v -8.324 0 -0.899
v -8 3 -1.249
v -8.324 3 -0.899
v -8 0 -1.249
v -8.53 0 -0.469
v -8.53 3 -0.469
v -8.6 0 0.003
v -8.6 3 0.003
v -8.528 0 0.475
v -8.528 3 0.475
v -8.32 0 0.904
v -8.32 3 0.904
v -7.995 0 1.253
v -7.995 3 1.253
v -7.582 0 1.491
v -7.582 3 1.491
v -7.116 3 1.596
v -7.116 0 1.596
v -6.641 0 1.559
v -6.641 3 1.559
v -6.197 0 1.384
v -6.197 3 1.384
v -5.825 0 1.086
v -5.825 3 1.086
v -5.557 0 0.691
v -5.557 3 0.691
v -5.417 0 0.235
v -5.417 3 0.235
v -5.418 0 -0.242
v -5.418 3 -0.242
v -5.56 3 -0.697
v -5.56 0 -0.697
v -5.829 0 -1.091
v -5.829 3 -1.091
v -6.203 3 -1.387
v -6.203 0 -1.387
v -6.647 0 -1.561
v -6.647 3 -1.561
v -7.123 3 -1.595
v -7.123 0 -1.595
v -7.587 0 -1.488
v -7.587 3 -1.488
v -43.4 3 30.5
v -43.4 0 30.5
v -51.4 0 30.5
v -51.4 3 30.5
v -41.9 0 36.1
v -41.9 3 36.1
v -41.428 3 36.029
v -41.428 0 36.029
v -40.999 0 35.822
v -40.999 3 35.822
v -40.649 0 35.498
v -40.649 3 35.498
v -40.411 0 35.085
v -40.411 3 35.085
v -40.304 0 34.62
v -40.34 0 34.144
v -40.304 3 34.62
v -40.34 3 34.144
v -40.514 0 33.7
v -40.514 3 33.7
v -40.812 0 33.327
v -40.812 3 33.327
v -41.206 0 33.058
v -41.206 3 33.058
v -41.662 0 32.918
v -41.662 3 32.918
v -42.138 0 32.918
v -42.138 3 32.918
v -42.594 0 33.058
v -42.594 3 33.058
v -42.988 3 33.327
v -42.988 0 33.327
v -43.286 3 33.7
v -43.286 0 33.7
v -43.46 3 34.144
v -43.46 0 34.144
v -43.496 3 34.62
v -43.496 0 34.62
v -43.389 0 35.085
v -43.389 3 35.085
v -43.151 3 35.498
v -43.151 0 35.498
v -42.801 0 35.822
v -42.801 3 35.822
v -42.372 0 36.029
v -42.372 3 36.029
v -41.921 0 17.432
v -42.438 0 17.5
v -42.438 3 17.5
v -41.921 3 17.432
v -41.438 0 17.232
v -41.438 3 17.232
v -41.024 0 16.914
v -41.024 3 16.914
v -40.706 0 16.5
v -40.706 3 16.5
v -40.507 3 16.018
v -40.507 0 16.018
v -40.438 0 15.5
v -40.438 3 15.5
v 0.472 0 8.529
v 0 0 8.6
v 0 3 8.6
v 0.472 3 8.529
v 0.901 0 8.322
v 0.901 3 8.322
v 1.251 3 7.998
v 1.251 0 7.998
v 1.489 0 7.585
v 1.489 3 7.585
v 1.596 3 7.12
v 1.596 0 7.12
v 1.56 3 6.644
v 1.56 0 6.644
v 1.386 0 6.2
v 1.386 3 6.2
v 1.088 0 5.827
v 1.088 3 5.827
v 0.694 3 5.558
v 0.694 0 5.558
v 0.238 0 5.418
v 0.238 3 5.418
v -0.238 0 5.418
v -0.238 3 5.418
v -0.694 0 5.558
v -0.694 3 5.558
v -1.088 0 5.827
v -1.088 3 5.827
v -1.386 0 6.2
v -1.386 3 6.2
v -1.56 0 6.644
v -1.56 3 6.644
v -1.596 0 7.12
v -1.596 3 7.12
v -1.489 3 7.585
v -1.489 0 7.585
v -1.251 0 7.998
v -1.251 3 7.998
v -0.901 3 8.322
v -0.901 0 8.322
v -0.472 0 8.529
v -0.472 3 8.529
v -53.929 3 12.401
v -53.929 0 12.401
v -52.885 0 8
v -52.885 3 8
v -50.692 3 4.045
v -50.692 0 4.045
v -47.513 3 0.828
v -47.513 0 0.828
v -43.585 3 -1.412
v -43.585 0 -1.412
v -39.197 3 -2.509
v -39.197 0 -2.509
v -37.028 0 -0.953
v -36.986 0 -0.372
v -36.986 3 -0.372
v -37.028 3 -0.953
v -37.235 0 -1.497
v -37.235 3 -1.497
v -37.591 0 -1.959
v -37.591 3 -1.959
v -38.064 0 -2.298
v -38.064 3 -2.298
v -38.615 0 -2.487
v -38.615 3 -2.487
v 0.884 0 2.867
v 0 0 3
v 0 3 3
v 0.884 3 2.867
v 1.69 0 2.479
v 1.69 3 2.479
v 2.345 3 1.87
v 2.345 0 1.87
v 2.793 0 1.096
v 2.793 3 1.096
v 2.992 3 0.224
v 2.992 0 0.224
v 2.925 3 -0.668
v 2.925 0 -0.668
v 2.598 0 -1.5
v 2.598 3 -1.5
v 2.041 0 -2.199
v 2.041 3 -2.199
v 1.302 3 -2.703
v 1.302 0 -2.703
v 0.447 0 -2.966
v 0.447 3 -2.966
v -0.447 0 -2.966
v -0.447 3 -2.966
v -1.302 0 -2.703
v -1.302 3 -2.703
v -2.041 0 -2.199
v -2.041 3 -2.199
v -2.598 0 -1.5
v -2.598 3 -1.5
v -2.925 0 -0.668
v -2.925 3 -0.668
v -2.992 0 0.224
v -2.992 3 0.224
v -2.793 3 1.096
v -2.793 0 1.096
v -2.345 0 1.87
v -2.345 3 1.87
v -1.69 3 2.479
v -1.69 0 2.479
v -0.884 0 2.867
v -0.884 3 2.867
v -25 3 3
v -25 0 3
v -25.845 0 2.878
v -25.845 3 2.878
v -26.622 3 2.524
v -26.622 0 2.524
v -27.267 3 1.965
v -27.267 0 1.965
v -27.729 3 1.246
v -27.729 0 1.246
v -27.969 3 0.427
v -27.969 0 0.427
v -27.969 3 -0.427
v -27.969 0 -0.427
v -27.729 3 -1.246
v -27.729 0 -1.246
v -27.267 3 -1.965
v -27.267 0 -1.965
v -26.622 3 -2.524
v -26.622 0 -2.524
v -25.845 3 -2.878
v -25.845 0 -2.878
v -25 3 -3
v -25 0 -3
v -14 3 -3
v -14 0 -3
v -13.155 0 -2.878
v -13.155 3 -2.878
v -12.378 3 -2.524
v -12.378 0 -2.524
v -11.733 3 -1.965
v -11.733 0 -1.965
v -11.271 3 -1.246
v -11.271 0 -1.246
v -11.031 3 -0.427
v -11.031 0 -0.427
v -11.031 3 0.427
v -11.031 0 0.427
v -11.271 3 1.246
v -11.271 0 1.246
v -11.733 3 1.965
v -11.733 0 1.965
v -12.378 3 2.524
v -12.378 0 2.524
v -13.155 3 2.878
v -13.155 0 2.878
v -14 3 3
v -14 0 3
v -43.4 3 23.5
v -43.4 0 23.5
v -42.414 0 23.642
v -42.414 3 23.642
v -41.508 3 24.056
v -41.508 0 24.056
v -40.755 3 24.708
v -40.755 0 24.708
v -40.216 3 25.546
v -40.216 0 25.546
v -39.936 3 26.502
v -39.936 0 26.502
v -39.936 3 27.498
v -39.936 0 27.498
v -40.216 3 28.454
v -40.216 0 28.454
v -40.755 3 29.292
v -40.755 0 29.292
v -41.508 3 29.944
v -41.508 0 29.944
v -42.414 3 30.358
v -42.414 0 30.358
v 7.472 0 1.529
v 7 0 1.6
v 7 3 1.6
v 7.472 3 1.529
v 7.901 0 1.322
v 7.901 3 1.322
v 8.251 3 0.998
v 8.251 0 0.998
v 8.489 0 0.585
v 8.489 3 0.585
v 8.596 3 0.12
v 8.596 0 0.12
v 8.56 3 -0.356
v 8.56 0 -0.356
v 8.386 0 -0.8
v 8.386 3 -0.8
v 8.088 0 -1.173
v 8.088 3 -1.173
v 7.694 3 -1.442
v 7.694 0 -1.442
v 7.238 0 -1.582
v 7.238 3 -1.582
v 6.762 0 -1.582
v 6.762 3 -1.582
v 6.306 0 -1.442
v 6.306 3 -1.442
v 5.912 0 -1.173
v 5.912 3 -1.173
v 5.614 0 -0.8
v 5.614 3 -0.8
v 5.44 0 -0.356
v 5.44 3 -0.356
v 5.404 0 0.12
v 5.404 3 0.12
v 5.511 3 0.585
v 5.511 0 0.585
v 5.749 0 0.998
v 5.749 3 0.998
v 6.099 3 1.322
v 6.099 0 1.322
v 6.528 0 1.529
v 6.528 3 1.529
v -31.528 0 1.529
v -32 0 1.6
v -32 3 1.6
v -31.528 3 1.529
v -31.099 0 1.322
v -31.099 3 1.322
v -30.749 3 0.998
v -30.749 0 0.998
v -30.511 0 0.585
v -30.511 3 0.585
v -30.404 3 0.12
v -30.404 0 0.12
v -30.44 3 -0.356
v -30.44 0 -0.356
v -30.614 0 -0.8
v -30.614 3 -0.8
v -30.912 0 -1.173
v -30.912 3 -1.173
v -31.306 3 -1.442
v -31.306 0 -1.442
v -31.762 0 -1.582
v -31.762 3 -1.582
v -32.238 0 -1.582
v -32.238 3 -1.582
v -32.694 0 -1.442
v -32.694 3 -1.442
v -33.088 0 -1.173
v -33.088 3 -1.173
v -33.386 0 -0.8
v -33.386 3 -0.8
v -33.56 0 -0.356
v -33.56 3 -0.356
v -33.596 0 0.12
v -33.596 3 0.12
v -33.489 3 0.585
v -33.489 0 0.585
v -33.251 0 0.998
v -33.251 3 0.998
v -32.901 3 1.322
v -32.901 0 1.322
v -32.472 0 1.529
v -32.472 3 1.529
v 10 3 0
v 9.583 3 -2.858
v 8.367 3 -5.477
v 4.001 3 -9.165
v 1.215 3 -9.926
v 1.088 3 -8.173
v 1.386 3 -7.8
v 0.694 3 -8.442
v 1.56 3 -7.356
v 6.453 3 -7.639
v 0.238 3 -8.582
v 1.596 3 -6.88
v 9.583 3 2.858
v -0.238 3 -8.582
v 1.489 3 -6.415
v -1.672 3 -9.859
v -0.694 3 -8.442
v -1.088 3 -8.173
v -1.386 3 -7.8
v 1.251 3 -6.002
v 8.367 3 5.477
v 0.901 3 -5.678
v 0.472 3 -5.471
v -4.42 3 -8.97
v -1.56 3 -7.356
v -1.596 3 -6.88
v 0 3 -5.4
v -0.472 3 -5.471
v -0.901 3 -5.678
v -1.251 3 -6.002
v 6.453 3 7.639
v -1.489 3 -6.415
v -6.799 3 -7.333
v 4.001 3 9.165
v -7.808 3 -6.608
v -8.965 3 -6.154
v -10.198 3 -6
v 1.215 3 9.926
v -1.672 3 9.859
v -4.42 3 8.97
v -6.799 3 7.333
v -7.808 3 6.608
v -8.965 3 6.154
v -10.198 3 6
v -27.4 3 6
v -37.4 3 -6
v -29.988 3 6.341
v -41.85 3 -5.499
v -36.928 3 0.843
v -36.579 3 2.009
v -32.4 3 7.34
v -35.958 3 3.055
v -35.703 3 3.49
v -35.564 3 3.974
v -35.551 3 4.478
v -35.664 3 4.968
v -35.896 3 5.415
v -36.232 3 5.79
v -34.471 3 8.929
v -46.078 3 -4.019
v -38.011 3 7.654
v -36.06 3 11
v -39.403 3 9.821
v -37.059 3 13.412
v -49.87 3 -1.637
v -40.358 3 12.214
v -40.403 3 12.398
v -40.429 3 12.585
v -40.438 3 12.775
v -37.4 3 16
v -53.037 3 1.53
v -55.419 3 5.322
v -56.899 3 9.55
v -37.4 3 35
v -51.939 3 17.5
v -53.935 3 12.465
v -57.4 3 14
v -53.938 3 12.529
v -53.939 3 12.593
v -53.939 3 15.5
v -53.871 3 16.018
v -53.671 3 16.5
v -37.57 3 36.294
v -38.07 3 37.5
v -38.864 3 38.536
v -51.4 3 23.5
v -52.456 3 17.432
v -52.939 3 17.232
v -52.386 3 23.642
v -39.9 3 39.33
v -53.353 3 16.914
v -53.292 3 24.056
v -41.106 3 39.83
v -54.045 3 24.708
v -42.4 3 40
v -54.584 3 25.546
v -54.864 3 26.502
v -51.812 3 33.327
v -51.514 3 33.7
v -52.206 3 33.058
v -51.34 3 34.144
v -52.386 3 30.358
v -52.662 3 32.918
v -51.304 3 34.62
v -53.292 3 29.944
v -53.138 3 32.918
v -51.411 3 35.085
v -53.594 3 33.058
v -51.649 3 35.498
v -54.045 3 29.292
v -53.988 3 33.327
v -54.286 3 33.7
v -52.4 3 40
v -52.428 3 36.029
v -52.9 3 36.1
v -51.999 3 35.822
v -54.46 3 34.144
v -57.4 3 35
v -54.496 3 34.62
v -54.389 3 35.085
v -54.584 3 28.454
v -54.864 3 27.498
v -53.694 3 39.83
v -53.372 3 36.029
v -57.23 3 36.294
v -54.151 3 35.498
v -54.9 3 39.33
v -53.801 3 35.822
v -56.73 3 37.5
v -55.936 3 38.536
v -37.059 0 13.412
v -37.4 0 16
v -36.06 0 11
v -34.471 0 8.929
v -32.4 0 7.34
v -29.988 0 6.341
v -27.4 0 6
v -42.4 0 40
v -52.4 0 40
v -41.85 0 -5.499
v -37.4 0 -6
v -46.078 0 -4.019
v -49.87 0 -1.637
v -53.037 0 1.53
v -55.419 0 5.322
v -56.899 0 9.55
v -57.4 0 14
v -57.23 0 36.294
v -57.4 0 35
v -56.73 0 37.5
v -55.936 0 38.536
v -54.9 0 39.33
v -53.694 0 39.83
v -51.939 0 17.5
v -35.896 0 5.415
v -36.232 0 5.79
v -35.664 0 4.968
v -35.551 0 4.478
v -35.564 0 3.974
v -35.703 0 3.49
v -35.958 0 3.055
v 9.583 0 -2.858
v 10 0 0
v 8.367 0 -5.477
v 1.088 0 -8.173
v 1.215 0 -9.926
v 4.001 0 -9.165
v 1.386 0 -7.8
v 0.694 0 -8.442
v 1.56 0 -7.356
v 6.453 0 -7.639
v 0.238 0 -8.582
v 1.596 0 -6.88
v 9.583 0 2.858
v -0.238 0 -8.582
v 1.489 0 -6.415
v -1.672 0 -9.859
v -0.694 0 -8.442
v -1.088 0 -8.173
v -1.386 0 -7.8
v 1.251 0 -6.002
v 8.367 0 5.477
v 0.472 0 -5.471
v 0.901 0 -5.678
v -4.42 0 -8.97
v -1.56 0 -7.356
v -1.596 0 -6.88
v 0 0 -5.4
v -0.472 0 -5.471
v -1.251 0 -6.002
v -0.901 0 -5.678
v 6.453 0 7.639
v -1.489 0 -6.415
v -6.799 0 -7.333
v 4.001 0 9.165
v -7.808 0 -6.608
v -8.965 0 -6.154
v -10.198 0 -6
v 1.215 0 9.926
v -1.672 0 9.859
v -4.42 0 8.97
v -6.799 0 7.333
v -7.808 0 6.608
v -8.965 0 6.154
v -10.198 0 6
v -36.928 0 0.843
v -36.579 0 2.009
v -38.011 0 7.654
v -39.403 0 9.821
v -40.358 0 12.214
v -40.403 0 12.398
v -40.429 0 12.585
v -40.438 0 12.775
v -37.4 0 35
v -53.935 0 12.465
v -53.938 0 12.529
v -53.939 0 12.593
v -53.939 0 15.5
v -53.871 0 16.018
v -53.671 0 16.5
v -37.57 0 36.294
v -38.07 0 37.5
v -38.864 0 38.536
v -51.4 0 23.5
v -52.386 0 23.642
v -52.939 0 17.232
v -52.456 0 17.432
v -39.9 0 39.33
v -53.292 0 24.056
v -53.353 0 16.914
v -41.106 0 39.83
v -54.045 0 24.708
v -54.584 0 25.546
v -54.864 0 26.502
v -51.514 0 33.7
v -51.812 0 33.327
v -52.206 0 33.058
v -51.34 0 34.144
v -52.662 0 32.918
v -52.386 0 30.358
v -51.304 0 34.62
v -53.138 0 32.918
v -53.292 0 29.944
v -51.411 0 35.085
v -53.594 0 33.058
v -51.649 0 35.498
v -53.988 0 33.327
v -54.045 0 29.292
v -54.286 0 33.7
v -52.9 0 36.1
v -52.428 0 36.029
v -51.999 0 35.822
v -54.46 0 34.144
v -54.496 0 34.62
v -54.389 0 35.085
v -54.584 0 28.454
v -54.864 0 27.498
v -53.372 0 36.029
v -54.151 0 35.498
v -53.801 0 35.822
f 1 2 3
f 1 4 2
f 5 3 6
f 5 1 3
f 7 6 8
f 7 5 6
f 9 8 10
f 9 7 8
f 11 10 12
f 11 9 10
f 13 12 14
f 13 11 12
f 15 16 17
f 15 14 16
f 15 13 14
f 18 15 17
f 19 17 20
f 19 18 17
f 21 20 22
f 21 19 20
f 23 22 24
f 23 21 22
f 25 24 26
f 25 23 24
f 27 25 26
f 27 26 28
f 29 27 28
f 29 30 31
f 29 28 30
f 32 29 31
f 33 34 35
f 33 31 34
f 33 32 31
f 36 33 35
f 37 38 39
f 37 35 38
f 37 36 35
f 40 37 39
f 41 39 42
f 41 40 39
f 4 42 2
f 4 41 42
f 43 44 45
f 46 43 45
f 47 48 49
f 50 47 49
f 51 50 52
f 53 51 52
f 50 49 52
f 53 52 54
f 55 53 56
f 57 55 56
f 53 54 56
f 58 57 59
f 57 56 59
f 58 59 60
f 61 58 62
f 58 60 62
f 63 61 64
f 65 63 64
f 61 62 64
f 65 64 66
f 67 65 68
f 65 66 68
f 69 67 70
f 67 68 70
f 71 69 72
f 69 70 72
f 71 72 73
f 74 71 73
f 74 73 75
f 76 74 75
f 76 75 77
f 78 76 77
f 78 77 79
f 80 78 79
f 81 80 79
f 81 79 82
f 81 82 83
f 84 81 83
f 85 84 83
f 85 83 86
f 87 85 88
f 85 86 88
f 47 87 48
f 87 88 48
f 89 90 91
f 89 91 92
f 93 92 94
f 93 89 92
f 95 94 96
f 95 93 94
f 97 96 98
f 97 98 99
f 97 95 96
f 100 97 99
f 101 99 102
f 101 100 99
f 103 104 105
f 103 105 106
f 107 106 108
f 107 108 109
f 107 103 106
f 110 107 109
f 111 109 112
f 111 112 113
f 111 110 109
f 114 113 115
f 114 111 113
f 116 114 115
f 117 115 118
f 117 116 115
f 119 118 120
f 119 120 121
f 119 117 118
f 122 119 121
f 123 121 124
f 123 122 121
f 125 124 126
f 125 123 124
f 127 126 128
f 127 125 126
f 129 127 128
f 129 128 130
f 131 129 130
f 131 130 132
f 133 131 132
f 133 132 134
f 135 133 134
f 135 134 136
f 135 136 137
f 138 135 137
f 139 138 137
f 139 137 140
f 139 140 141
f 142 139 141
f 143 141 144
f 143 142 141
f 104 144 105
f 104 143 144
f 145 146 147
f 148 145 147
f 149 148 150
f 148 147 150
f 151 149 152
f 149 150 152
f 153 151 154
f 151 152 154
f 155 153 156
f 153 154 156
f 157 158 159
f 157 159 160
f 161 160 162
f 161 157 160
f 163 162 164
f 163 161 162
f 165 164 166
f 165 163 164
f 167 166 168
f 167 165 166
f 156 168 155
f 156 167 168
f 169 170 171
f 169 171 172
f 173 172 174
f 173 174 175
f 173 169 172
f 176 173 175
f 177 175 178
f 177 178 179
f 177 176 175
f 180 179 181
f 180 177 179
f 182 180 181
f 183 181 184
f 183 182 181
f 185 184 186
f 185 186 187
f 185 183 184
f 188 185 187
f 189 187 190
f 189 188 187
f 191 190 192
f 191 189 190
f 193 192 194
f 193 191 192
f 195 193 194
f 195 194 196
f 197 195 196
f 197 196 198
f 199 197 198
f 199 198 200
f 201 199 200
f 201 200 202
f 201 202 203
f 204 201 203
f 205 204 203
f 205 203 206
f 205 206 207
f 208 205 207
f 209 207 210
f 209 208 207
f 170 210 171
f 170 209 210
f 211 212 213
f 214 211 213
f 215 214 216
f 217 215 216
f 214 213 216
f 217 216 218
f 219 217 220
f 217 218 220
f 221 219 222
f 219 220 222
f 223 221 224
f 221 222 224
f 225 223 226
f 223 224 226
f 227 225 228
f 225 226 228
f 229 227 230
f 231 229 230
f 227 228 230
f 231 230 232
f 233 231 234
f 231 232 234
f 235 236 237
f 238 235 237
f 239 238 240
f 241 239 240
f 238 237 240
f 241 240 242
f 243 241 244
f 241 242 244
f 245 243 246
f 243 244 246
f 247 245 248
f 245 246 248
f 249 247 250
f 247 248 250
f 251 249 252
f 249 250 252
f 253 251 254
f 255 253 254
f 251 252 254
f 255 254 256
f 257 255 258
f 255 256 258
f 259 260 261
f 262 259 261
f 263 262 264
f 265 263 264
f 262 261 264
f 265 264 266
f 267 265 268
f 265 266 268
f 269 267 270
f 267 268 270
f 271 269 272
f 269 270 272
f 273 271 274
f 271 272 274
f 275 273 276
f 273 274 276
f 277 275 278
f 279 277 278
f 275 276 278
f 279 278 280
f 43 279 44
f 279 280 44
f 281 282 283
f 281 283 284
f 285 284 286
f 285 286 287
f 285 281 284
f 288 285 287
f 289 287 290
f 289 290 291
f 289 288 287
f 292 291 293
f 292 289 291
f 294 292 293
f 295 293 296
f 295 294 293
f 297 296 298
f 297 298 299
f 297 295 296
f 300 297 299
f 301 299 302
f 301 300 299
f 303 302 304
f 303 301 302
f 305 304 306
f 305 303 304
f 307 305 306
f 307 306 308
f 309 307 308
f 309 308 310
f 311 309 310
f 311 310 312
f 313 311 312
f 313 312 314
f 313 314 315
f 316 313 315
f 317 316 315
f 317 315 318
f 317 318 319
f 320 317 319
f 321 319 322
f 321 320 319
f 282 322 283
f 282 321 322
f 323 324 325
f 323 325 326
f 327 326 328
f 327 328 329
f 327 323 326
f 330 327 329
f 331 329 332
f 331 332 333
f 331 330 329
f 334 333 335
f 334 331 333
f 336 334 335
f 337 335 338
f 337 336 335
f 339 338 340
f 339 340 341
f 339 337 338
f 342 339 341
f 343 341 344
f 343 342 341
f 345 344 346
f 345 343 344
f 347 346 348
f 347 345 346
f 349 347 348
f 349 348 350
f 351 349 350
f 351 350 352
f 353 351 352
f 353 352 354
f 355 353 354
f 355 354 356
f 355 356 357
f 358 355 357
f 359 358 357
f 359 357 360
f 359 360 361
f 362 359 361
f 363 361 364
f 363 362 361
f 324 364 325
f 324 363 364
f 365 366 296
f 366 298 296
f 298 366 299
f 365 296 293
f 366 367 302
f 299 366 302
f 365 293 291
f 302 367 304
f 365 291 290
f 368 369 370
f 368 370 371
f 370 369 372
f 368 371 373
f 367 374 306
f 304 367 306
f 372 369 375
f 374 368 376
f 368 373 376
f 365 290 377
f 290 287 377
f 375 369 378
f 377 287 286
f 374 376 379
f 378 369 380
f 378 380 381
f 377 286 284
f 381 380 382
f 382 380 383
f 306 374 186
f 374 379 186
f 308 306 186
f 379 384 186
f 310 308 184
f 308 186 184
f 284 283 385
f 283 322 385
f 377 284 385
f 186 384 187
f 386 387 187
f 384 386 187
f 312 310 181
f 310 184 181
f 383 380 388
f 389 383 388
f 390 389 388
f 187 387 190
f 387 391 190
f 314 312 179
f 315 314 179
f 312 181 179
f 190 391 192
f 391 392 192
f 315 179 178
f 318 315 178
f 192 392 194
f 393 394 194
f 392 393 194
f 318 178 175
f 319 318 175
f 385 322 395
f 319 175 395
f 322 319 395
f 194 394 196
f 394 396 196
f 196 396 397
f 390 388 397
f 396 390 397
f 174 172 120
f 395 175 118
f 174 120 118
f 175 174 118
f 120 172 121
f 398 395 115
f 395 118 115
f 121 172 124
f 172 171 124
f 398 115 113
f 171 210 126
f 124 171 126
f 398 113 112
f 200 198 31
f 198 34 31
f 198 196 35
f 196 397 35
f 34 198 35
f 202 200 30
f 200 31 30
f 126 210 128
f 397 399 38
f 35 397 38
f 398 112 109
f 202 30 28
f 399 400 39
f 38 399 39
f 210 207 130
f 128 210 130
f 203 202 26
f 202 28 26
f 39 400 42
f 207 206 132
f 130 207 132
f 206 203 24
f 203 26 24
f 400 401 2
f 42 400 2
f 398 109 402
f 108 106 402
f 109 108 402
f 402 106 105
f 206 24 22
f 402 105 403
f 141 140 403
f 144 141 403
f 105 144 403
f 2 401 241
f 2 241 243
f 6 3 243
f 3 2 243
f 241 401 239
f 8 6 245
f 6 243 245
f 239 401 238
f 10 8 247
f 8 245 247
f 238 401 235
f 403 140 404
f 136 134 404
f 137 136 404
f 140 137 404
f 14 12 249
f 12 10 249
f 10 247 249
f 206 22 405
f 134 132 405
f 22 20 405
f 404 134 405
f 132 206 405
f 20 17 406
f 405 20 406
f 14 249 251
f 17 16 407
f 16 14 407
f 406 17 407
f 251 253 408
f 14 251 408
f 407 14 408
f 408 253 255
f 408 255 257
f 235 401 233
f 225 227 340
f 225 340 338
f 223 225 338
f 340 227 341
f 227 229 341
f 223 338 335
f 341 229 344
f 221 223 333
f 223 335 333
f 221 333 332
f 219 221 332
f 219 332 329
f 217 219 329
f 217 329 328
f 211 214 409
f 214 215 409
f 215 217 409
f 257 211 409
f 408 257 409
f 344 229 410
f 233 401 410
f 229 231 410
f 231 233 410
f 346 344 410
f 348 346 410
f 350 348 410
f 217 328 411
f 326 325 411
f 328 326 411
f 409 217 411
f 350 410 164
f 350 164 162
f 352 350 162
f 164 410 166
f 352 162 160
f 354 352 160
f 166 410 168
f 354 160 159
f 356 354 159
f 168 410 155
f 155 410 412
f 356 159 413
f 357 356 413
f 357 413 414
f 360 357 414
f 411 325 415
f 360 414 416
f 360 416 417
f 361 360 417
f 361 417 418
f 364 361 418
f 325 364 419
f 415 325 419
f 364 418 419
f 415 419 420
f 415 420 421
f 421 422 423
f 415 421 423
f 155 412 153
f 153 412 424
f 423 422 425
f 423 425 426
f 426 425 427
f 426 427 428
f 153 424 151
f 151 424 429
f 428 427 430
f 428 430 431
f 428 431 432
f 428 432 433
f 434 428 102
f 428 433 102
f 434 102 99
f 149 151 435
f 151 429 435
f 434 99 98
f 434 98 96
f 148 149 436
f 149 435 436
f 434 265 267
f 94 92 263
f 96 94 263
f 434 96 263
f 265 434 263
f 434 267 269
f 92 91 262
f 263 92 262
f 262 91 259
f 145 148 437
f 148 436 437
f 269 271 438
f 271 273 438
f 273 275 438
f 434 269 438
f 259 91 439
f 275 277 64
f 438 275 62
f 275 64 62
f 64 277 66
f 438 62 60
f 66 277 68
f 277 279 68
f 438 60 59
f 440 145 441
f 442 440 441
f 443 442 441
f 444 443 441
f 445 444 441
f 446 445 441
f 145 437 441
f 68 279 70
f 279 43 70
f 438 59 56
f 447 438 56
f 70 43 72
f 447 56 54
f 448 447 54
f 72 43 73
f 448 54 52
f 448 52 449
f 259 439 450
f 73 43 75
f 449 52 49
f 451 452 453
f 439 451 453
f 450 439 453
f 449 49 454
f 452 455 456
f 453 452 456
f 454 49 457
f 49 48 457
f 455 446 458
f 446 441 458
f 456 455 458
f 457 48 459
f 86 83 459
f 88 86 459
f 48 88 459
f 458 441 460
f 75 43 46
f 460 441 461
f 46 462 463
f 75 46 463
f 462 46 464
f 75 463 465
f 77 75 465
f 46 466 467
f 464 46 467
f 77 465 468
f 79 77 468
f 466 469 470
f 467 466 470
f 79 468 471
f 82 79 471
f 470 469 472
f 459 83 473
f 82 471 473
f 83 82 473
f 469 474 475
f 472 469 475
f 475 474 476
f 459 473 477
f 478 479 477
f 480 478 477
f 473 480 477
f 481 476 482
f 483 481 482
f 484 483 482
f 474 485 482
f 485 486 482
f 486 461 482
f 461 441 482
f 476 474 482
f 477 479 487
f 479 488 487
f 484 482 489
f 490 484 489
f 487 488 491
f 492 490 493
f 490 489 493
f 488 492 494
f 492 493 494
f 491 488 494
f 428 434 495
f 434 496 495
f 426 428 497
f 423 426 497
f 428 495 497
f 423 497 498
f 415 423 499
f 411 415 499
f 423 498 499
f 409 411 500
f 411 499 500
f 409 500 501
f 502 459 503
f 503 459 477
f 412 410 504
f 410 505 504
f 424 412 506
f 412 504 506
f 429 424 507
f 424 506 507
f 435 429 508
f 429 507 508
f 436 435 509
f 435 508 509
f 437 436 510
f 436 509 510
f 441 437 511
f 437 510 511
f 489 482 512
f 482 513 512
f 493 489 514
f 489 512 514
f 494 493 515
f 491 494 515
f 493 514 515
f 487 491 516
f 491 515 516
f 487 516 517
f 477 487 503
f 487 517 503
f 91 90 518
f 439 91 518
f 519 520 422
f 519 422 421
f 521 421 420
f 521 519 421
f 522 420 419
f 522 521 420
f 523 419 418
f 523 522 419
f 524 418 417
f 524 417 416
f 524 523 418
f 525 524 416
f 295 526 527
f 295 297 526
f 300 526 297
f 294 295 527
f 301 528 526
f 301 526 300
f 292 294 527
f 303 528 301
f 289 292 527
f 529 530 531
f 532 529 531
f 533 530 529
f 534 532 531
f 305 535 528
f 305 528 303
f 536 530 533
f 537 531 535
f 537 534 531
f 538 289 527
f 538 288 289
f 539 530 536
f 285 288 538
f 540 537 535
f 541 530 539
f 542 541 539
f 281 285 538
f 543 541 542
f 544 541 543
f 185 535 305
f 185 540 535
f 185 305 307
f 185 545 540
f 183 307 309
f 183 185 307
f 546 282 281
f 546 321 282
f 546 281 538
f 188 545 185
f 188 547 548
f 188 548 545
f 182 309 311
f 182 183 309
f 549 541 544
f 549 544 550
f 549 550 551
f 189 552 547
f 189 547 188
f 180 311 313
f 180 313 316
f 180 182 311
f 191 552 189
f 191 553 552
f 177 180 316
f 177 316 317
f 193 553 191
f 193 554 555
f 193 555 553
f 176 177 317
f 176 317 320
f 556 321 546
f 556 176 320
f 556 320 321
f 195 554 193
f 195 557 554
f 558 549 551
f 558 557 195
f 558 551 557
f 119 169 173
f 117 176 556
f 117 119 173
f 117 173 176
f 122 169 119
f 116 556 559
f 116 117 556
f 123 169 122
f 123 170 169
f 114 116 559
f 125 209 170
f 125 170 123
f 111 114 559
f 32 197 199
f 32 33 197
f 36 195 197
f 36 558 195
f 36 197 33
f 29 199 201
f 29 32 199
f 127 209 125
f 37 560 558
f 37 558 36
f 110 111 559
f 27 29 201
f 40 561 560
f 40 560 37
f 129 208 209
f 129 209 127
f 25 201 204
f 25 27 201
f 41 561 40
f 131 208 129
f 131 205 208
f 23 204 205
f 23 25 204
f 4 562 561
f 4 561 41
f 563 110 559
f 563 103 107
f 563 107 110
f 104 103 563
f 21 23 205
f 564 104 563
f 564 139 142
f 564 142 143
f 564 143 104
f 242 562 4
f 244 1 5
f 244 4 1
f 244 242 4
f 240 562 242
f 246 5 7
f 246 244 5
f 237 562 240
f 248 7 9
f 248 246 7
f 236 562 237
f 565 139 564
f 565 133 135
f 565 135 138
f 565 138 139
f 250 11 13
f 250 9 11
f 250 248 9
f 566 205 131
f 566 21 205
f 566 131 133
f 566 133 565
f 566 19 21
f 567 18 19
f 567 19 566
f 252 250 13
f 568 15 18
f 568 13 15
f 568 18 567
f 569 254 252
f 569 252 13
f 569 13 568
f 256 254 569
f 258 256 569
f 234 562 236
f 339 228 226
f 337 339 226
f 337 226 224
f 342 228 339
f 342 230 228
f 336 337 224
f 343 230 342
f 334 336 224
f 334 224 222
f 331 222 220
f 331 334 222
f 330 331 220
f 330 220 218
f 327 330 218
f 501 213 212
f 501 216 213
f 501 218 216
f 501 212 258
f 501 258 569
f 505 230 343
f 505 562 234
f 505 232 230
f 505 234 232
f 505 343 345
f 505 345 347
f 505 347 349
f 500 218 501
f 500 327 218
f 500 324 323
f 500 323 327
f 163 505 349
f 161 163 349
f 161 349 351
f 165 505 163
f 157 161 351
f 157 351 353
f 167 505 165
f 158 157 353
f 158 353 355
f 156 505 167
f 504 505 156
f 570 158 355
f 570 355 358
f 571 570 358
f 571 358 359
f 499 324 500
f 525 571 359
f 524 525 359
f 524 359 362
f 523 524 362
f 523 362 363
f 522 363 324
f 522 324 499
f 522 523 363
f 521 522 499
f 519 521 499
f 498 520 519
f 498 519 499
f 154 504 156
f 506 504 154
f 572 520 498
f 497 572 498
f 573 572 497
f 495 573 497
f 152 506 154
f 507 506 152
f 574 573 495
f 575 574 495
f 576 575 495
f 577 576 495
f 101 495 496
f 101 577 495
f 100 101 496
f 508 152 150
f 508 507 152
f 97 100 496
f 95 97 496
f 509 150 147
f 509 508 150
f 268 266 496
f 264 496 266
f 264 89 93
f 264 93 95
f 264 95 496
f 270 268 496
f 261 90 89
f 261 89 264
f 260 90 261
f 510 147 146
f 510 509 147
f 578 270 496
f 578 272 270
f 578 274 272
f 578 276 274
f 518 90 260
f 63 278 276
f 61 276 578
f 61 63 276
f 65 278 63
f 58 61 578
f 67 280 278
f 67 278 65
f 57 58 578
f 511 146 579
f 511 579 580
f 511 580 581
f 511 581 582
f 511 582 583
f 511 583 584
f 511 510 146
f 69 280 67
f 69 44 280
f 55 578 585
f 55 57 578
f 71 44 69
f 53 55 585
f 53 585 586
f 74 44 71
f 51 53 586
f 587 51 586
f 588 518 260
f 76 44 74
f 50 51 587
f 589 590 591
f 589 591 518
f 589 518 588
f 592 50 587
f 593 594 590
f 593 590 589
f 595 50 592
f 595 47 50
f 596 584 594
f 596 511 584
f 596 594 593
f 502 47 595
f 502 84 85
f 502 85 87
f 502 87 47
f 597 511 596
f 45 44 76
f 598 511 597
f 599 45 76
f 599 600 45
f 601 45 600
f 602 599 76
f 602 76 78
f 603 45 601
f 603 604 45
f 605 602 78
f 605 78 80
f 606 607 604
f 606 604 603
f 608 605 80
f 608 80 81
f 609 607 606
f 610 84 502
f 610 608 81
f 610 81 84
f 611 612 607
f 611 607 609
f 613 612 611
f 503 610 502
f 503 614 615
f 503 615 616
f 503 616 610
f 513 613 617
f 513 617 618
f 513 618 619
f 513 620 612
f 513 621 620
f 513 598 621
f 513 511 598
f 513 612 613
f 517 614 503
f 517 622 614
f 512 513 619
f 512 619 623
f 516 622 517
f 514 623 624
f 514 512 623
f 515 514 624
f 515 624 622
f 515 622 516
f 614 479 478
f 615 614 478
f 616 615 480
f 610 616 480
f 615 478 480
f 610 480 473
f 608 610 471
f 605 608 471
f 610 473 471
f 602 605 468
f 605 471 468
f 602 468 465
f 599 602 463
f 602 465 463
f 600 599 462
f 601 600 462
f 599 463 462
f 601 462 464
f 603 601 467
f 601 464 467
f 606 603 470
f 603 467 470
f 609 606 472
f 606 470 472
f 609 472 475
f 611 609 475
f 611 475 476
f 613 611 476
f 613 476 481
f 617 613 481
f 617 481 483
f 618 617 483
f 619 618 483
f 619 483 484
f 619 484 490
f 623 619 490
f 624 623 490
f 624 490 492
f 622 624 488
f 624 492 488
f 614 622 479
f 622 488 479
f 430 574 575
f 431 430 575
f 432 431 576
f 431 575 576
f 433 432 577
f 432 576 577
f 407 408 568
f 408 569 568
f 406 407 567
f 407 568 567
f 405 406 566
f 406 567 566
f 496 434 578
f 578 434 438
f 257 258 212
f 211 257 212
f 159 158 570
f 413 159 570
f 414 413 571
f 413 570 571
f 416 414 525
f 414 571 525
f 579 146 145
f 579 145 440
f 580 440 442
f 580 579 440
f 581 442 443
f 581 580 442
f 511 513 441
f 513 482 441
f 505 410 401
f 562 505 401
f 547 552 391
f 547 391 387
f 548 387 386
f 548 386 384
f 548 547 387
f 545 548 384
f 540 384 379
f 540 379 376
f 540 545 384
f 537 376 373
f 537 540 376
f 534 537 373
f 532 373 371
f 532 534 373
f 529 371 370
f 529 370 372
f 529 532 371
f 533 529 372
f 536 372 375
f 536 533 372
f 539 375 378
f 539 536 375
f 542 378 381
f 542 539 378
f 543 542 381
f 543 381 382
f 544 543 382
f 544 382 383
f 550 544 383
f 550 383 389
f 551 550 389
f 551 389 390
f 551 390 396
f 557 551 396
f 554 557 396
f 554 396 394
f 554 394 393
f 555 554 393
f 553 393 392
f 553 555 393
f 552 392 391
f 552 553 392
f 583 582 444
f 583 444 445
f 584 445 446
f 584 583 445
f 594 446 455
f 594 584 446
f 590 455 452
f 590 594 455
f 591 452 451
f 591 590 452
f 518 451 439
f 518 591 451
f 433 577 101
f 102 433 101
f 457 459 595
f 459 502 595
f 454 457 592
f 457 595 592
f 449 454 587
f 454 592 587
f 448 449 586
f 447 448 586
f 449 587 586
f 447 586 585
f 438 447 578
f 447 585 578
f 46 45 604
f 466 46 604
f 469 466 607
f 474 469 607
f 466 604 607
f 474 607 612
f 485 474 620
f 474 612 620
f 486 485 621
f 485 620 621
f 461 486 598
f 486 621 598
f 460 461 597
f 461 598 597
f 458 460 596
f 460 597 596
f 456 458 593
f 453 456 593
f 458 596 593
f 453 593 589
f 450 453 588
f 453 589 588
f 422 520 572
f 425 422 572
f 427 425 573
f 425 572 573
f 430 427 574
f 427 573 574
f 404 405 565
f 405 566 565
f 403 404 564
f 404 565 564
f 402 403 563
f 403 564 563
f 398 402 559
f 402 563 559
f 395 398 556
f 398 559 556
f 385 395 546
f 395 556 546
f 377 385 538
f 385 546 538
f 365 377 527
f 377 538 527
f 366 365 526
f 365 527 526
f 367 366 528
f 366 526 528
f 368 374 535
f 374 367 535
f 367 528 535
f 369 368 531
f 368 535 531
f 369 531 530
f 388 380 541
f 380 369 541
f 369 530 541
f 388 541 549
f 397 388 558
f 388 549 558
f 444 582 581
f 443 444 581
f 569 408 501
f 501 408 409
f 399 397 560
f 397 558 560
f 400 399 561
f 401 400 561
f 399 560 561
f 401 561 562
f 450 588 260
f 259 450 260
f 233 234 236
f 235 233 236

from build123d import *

# Parameters (mm, degrees)
SKETCH_1_R          = 10
SKETCH_1_R_2        = 3
SKETCH_1_R_3        = 1.6
SKETCH_1_R_4        = 1.600000000000001
SKETCH_1_R_5        = 1.6000000000000003
SKETCH_1_R_6        = 1.6000000000000019
EXTRUDE_1_DEPTH     = 3
EXTRUDE_2_DEPTH     = 3
SKETCH_3_R          = 1.5999999999999974
EXTRUDE_3_DEPTH     = 3
FILLET_1_R          = 10
FILLET_2_R          = 20
CUT_EXTRUDE_START   = -3
SKETCH_4_R          = 1.6000000000000019
SKETCH_4_R_2        = 1.599999999999998
CUT_EXTRUDE_1_DEPTH = 3
FILLET_3_R          = 5
FILLET_4_R          = 2


with BuildPart() as part:
    # 草图1 → 凸台-拉伸1 (new body)
    with BuildSketch(Plane(origin=(0, 0, 0), x_dir=(1, 0, 0), z_dir=(0, 1, 0))):
        with Locations(Location((0, 0, 0), (0, 0, 270))):
            Circle(SKETCH_1_R)
        with Locations(Location((0, 0, 0), (0, 0, 270))):
            Circle(SKETCH_1_R_2, mode=Mode.SUBTRACT)
        with Locations(Location((0, 6.999999999999999, 0), (0, 0, 270))):
            Circle(SKETCH_1_R_3, mode=Mode.SUBTRACT)
        with Locations(Location((6.999999999999998, 0, 0), (0, 0, 270))):
            Circle(SKETCH_1_R_4, mode=Mode.SUBTRACT)
        with Locations(Location((8.7e-16, -6.999999999999999, 0), (0, 0, 270))):
            Circle(SKETCH_1_R_5, mode=Mode.SUBTRACT)
        with Locations(Location((-6.999999999999999, -8.7e-16, 0), (0, 0, 270))):
            Circle(SKETCH_1_R_6, mode=Mode.SUBTRACT)
    extrude(amount=EXTRUDE_1_DEPTH)

    # 草图2 → 凸台-拉伸2 (add)
    with BuildSketch(Plane(origin=(0, 3, 0), x_dir=(1, 0, 0), z_dir=(0, 1, 0))):
        Polygon((-8.000000000000005, -5.999999999999994), (-57.4, -6), (-57.4, 6), (-8.000000000000005, 5.999999999999994), align=None)
    extrude(amount=-EXTRUDE_2_DEPTH)

    # 草图3 → 凸台-拉伸3 (add)
    with BuildSketch(Plane(origin=(0, 3, 0), x_dir=(1, 0, 0), z_dir=(0, 1, 0))):
        Polygon((-57.4, -6), (-37.399999999999984, -6), (-37.39999999999999, -40), (-57.39999999999999, -40), align=None)
        with Locations(Location((-52.89999999999999, -34.5, 0), (0, 0, 270))):
            Circle(SKETCH_3_R, mode=Mode.SUBTRACT)
        with Locations(Location((-41.89999999999999, -34.5, 0), (0, 0, 270))):
            Circle(SKETCH_3_R, mode=Mode.SUBTRACT)
    extrude(amount=-EXTRUDE_3_DEPTH)

    # 圆角1
    fillet_1_edges = [part.edges().sort_by_distance(p)[0] for p in [
        (-37.399999999999984, 1.5, 6),
    ]]
    fillet(fillet_1_edges, radius=FILLET_1_R)

    # 圆角2
    fillet_2_edges = [part.edges().sort_by_distance(p)[0] for p in [
        (-57.4, 1.5, -6),
    ]]
    fillet(fillet_2_edges, radius=FILLET_2_R)

    # 草图4 → 切除-拉伸1 (cut)
    with BuildSketch(Plane(origin=(0, 3, 0), x_dir=(1, 0, 0), z_dir=(0, 1, 0)).offset(CUT_EXTRUDE_START)):
        with Locations(Location((-6.999999999999999, -8.7e-16, 0), (0, 0, 270))):
            Circle(SKETCH_4_R)
        with Locations(Location((-32, 0, 0), (0, 0, 270))):
            Circle(SKETCH_4_R_2)
        with BuildLine():
            Line((-24.999999999999996, 3), (-13.999999999999998, 3))
            ThreePointArc((-13.999999999999998, 3), (-10.999999999999998, 0), (-13.999999999999998, -3))
            Line((-13.999999999999998, -3), (-24.999999999999996, -3))
            ThreePointArc((-24.999999999999996, -3), (-27.999999999999996, 3.7e-16), (-24.999999999999996, 3))
        make_face()
        with BuildLine():
            Line((-51.399999999999984, -23.500000000000004), (-43.39999999999999, -23.500000000000004))
            ThreePointArc((-43.39999999999999, -23.500000000000004), (-39.89999999999999, -27.000000000000004), (-43.39999999999999, -30.500000000000004))
            Line((-43.39999999999999, -30.500000000000004), (-51.399999999999984, -30.500000000000004))
            ThreePointArc((-51.399999999999984, -30.500000000000004), (-54.899999999999984, -27.000000000000004), (-51.399999999999984, -23.500000000000004))
        make_face()
        with BuildLine():
            Line((-40.43840481040531, -12.5), (-40.43840481040531, -17.500000000000004))
            Line((-40.43840481040531, -17.500000000000004), (-53.93871883229112, -17.500000000000007))
            Line((-53.93871883229112, -17.500000000000007), (-53.938718832291116, -12.5))
            ThreePointArc((-53.938718832291116, -12.5), (-48.18321723568186, -1.3706117859306186), (-36.28930043689978, 2.5694166190035115))
            ThreePointArc((-36.28930043689978, 2.5694166190035115), (-36.81589304125609, -1.3443117998370948), (-34.338414417674585, -4.419481645081424))
            ThreePointArc((-34.338414417674585, -4.419481645081424), (-38.17460072758567, -7.866244461436596), (-40.43840481040531, -12.5))
        make_face()
    extrude(amount=CUT_EXTRUDE_1_DEPTH, mode=Mode.SUBTRACT)

    # 圆角3
    fillet_3_edges = [part.edges().sort_by_distance(p)[0] for p in [
        (-8.000000000000005, 1.5, -5.999999999999994),
        (-8.000000000000005, 1.5, 5.999999999999994),
        (-57.39999999999999, 1.5, 40),
        (-37.39999999999999, 1.5, 40),
    ]]
    fillet(fillet_3_edges, radius=FILLET_3_R)

    # 圆角4
    # the kernel refuses this fillet: 2 mm, written as the material it adds along each edge
    with BuildSketch(Plane(origin=(-36.28930043689978, 0, -2.5694166190035155), x_dir=(-0.9997848253310014, 0, 0.020743746958035388), z_dir=(0, 1, 0))) as fillet_4_piece_1:
        with BuildLine():
            CenterArc((2.7332128689398965, 1.9923174543114084), FILLET_4_R, 174.54438439769004, 100.47920721380297)
            ThreePointArc((0.7422725749788821, 2.1824667269433027), (0.49863093433961686, 1.0478715203584514), (0, 0))
            ThreePointArc((0, 0), (1.4541723542762737, -0.06379048821461454), (2.9083447085525433, 0))
        make_face()
    extrude(amount=3)
    with BuildSketch(Plane(origin=(-34.338414417674585, 0, 4.419481645081424), x_dir=(-0.7648370504250814, 0, -0.6442237858827173), z_dir=(0, 1, 0))) as fillet_4_piece_2:
        with BuildLine():
            CenterArc((2.5407101067548044, 1.9546581979795647), FILLET_4_R, 170.9703370053984, 86.80615278737906)
            ThreePointArc((0.5654956678276036, 2.2685497720198655), (0.33194950705873716, 1.1220100755321154), (0, 0))
            ThreePointArc((0, 0), (1.0586292111478346, 0.11335450505108799), (2.117258422295671, -7e-17))
        make_face()
    extrude(amount=3)
    with BuildSketch(Plane(origin=(-40.43840481040531, 0, 17.500000000000004), x_dir=(0, 0, -1), z_dir=(0, 1, 0))) as fillet_4_piece_3:
        with BuildLine():
            CenterArc((FILLET_4_R, FILLET_4_R), FILLET_4_R, 180, 90)
            Line((0, FILLET_4_R), (0, 0))
            Line((0, 0), (FILLET_4_R, 0))
        make_face()
    extrude(amount=3)
    with BuildSketch(Plane(origin=(-53.93871883229112, 0, 17.500000000000007), x_dir=(1, 0, 0), z_dir=(0, 1, 0))) as fillet_4_piece_4:
        with BuildLine():
            CenterArc((FILLET_4_R, FILLET_4_R), FILLET_4_R, 179.99999999999986, 90.00000000000011)
            Line((7.11e-15, FILLET_4_R), (0, 0))
            Line((0, 0), (FILLET_4_R, 0))
        make_face()
    extrude(amount=3)
    with BuildSketch(Plane(origin=(-53.938718832291116, 0, 12.5), x_dir=(0.09331197212510238, 0, -0.9956369196941844), z_dir=(0, 1, 0))) as fillet_4_piece_5:
        with BuildLine():
            CenterArc((0.09361195431707342, -1.9999910052952001), FILLET_4_R, 89.8281631699166, 5.526008171417317)
            Line((-0.09301198993312956, -0.00871716590683111), (0, 0))
            ThreePointArc((0, 0), (0.04980509112364704, 7.468574010459e-05), (0.09961018224729987, 0))
        make_face()
    extrude(amount=3)
    # the kernel refuses this fillet: 2 mm, written as the material it takes off along each edge
    with BuildSketch(Plane(origin=(-40.43840481040531, -0.7436301227400532, 12.500000000000004), x_dir=(0.26988358130767626, 0, -0.9628929600638604), z_dir=(0, 1, 0))) as fillet_4_2_piece_1:
        with BuildLine():
            CenterArc((0.2754185639777855, -1.9998786277005756), FILLET_4_R, 89.36877437844454, 16.28856500222963)
            Line((-0.2643485986375687, -0.0740927075728552), (0, 0))
            ThreePointArc((0, 0), (0.14872602454800565, 0.00081926302110449), (0.29745204909602135, 1e-17))
        make_face()
    extrude(amount=4.4872602454801065, mode=Mode.SUBTRACT)


solid = part.part
